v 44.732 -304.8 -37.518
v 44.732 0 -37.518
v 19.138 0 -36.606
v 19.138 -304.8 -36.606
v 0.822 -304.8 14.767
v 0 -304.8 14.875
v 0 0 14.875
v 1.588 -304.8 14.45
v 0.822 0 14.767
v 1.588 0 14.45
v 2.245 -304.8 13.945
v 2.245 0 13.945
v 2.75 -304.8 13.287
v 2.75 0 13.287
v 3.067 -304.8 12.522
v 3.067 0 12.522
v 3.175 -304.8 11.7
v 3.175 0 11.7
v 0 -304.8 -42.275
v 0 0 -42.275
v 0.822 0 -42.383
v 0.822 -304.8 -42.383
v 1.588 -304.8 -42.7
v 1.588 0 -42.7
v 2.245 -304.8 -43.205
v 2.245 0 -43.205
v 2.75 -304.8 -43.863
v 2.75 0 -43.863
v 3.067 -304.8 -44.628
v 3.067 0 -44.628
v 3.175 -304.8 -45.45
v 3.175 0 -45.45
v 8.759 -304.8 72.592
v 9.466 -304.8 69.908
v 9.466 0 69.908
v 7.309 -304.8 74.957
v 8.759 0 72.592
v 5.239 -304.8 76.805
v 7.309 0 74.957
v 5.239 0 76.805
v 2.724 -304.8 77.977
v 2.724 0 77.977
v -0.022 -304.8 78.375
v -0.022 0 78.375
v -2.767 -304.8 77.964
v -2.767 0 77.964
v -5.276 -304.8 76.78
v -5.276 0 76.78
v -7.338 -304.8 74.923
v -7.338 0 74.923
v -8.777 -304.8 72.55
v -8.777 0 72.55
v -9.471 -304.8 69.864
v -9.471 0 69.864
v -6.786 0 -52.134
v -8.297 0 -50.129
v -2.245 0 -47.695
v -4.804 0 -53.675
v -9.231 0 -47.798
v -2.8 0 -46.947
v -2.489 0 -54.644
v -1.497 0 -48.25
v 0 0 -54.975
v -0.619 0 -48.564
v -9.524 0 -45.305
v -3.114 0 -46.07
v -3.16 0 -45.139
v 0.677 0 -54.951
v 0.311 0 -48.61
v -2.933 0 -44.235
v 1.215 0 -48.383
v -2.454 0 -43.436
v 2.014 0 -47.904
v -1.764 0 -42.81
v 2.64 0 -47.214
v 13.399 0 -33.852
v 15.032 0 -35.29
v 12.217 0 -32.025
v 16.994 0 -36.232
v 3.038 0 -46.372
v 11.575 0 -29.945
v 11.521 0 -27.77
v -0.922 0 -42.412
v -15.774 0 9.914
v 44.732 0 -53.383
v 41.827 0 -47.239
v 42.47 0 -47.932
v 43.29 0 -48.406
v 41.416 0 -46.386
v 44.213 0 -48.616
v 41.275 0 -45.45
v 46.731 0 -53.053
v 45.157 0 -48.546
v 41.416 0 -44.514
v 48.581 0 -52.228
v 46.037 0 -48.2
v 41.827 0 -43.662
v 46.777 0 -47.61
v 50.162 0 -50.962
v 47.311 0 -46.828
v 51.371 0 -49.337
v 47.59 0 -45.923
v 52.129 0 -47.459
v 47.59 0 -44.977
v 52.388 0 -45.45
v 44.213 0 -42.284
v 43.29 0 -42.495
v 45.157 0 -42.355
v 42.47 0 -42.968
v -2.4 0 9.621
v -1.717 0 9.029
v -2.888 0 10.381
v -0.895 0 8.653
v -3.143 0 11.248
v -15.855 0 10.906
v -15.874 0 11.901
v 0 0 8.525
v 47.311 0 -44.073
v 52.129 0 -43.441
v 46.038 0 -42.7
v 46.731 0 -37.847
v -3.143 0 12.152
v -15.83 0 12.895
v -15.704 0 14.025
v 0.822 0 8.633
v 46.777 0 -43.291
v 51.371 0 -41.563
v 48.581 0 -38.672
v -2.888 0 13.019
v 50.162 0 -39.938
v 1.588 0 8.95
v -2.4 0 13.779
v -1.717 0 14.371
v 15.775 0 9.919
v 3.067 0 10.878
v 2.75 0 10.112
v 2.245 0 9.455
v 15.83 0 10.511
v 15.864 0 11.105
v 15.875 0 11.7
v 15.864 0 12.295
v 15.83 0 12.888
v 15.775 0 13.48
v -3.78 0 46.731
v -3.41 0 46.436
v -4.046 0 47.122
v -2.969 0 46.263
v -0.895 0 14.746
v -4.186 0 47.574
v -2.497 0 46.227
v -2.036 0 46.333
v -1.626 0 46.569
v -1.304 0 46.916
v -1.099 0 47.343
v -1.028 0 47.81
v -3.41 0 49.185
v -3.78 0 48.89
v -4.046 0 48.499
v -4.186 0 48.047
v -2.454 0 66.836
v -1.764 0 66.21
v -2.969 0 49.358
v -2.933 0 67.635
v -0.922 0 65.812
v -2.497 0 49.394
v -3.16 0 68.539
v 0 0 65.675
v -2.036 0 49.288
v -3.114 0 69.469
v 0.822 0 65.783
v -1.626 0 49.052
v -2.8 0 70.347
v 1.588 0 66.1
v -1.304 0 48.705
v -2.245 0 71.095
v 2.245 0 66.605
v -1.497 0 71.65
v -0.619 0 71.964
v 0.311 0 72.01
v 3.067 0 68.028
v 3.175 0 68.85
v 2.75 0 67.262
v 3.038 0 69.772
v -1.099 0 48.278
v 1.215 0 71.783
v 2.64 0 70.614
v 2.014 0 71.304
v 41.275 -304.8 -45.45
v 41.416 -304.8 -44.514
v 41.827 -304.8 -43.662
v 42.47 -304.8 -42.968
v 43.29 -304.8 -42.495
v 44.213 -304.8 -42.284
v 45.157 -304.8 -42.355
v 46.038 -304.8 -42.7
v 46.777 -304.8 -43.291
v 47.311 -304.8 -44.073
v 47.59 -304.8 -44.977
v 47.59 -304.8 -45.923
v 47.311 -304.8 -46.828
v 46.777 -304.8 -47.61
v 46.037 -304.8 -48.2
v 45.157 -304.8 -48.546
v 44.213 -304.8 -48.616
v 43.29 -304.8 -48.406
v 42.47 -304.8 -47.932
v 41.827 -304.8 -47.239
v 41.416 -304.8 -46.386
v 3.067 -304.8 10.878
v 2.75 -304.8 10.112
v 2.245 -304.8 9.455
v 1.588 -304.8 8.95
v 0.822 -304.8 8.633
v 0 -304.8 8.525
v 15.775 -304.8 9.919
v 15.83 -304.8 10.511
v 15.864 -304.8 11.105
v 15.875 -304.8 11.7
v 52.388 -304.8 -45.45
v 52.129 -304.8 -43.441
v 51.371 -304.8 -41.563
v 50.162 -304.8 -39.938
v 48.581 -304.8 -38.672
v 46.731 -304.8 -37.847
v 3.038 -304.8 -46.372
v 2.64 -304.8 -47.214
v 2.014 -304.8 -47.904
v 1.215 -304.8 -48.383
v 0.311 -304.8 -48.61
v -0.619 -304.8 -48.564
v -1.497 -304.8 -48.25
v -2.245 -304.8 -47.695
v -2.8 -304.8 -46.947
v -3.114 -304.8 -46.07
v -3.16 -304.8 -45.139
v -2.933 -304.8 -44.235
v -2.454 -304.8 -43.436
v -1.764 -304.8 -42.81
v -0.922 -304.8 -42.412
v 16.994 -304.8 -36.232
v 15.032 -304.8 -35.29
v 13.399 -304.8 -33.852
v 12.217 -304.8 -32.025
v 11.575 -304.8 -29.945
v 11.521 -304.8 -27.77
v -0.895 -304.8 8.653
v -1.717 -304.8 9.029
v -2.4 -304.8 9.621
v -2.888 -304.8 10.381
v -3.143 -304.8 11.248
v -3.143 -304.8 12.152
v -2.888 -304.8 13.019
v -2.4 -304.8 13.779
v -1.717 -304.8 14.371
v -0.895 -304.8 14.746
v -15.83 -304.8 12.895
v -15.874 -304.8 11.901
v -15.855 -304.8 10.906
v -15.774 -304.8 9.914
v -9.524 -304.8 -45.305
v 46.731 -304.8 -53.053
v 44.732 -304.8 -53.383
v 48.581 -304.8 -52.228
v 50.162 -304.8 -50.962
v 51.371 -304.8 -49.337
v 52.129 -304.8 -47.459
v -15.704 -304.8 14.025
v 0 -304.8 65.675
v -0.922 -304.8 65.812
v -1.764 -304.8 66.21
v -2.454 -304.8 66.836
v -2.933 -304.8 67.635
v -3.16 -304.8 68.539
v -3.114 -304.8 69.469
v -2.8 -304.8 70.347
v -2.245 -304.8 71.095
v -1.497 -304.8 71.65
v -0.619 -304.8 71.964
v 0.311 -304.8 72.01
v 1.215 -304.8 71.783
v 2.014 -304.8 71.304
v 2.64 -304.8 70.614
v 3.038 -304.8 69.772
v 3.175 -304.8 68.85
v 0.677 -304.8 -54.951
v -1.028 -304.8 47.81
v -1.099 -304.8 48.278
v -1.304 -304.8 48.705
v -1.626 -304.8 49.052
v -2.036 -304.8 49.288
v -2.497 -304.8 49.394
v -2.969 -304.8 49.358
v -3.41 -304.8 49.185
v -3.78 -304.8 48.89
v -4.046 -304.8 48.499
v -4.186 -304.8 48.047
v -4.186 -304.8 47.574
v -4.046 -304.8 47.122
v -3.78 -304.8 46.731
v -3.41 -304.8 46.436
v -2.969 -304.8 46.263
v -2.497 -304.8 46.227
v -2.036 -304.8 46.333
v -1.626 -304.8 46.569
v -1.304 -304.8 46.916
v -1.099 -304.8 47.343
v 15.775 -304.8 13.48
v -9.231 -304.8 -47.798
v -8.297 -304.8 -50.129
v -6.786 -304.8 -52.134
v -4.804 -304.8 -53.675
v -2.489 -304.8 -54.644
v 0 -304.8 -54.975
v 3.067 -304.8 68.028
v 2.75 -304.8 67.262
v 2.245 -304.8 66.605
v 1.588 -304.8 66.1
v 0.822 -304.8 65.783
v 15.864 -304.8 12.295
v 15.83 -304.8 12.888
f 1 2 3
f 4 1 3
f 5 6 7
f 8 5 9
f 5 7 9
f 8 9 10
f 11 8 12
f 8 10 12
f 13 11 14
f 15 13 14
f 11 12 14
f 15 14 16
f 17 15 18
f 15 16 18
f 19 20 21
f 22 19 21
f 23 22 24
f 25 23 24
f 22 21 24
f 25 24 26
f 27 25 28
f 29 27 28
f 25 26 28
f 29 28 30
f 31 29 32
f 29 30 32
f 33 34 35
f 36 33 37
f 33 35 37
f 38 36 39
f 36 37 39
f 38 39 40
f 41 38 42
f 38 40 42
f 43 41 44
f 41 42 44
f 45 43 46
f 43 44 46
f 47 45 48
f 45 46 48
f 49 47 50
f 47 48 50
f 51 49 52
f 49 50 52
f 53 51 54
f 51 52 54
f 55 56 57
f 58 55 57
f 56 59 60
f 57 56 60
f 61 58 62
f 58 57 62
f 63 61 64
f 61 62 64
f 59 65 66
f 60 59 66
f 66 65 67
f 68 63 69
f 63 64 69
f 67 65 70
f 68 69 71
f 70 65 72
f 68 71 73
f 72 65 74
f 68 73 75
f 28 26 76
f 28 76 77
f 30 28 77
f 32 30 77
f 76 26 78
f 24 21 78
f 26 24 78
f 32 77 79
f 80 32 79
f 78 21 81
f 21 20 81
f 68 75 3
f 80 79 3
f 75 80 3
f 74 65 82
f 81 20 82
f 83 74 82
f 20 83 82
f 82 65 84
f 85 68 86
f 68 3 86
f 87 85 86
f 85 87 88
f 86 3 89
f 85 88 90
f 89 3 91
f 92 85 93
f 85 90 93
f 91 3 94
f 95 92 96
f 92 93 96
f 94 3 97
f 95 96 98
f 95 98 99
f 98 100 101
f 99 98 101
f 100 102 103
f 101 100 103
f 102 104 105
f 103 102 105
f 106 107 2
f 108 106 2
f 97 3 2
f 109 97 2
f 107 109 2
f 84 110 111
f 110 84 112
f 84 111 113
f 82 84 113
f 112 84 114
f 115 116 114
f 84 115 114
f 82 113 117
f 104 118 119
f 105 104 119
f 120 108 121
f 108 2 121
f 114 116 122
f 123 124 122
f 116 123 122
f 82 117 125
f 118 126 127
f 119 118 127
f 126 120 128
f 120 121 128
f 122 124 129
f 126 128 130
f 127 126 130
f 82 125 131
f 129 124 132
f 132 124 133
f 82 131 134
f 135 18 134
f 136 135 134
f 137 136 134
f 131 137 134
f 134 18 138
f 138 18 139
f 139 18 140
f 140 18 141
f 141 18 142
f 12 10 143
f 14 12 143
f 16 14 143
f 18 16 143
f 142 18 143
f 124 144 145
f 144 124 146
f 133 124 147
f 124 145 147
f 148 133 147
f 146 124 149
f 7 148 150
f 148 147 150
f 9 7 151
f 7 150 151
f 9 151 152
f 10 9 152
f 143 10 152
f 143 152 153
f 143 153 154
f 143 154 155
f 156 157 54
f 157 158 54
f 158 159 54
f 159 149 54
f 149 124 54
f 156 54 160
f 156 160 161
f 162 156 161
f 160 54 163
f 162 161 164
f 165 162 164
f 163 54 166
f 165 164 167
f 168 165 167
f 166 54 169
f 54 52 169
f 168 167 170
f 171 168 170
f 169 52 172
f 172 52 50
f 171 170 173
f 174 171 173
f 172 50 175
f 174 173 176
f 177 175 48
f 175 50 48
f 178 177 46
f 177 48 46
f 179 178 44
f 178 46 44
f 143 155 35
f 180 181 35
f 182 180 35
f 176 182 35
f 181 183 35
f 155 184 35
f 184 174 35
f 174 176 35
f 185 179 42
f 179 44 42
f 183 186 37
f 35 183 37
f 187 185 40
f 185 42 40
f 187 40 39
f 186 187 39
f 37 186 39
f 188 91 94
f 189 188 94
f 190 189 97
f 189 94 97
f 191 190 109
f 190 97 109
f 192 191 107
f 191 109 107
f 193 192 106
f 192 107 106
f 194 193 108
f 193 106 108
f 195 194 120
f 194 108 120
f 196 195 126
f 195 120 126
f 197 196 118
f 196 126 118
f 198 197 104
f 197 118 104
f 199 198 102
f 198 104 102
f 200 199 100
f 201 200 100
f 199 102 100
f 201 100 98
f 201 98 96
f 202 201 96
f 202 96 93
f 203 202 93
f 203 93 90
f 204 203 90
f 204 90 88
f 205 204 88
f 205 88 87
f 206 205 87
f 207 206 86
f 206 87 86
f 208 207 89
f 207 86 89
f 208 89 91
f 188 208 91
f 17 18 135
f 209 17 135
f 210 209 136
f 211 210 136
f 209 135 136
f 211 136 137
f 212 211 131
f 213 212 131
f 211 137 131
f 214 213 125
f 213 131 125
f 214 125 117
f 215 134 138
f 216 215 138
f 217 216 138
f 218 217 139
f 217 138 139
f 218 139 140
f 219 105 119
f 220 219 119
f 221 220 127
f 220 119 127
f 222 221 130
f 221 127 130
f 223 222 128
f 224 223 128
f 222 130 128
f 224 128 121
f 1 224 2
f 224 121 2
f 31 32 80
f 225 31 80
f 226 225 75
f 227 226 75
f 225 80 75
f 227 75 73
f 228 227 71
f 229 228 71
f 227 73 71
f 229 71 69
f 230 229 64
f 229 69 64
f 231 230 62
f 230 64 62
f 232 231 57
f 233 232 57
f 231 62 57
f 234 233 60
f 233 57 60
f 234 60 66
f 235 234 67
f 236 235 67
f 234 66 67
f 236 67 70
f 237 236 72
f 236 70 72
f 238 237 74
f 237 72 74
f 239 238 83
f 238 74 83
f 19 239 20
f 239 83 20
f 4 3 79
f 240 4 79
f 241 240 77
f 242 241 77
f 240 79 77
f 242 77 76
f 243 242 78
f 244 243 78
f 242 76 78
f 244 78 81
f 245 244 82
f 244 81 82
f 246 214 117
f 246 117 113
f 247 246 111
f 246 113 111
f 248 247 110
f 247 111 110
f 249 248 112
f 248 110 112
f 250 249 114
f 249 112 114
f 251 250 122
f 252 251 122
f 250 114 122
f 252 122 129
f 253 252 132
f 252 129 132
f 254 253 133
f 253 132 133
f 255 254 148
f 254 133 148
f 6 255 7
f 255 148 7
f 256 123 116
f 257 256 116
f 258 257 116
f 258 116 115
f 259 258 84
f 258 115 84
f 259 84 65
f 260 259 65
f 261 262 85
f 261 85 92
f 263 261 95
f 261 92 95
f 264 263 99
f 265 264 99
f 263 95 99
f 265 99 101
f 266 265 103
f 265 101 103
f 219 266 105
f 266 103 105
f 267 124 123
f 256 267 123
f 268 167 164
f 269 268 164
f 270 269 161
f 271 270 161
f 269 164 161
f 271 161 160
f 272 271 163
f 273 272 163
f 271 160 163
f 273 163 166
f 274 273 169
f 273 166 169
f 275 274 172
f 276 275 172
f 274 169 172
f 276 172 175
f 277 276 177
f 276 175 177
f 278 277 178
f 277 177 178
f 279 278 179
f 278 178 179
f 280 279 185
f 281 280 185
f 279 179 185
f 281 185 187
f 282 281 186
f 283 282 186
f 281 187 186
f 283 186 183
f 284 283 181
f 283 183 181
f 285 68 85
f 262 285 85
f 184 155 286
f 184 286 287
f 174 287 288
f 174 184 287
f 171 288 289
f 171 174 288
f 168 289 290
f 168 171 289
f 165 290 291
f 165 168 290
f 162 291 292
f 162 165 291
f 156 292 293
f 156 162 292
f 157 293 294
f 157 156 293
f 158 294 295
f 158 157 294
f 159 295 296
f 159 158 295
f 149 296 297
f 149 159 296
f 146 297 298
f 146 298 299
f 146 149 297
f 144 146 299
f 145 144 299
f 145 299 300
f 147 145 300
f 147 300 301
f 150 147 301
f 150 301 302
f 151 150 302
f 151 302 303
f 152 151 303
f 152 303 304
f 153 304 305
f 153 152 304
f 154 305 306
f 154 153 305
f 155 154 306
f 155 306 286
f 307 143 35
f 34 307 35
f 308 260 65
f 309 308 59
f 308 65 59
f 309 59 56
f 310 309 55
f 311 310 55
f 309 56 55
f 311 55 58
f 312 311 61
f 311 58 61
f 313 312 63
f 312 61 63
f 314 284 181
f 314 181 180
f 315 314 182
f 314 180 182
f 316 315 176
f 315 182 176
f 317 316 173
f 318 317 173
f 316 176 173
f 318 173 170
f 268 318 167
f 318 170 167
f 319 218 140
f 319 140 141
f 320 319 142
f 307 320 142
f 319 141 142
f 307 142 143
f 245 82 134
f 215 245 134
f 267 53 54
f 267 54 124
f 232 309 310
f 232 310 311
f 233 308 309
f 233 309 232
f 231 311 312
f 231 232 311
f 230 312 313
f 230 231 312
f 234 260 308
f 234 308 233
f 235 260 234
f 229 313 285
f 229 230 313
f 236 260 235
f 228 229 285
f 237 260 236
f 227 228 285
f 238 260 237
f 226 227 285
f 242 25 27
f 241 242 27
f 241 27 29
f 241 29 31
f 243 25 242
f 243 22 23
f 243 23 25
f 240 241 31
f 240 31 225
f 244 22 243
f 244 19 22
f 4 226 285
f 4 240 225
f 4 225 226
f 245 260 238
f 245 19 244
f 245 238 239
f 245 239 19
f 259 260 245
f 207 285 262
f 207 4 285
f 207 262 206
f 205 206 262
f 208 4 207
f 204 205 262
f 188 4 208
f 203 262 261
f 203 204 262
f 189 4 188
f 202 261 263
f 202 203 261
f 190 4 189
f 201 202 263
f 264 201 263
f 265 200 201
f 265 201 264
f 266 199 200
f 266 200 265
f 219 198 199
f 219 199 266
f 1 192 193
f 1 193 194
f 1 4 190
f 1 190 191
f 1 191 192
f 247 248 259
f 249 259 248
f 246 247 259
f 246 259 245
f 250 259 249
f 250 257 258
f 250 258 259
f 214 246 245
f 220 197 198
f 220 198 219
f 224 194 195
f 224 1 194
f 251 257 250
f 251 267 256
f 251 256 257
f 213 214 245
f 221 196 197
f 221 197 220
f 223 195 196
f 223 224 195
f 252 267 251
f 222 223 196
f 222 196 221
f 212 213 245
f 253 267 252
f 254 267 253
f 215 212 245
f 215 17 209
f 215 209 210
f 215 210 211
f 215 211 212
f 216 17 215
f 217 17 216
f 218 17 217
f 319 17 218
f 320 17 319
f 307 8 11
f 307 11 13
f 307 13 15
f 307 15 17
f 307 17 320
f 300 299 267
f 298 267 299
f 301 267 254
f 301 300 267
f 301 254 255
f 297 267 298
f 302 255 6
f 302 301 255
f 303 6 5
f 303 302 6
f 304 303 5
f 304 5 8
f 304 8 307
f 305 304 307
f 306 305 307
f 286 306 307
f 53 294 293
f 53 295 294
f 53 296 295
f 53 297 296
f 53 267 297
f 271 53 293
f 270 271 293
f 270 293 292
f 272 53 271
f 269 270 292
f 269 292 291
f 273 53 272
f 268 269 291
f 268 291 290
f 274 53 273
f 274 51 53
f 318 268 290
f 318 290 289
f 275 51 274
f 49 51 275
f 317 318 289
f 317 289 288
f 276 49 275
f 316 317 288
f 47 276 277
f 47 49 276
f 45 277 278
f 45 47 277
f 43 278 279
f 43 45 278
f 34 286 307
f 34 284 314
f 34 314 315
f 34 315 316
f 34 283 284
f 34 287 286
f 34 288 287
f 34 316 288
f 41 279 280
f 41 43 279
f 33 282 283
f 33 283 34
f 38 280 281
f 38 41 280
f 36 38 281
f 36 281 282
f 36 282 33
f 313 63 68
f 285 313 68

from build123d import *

# Parameters (mm, degrees)
F0_R     = 1.5875
F1_DEPTH = 304.8


# Not quite as in the source:
# - ends of sketch curves that miss each other by under 0.0002 mm in the source are joined


with BuildPart() as f1:
    # F0 (on Front) → F1 (new body)
    with BuildSketch(Plane.XZ):
        with BuildLine():
            Line((0, -35.9251248209), (0, -42.2751248896))
            ThreePointArc((0, -42.2751248896), (2.2450640303, -43.2050608593), (3.175, -45.4501248896))
            Line((3.175, -45.4501248896), (9.5250000687, -45.4501248896))
            ThreePointArc((9.5250000687, -45.4501248896), (6.7351921394, -38.7149327502), (0, -35.9251248209))
        make_face()
        with BuildLine():
            ThreePointArc((3.175, -45.4501248896), (-2.2450640303, -47.6951889199), (0, -42.2751248896))
            Line((0, -42.2751248896), (0, -35.9251248209))
            ThreePointArc((0, -35.9251248209), (-6.6836697304, -38.6638014929), (-9.5238937406, -45.3049548981))
            ThreePointArc((-9.5238937406, -45.3049548981), (-6.7863233967, -52.13379462), (0, -54.9751249583))
            Line((0, -54.9751249583), (0.6773435819, -54.951010742))
            ThreePointArc((0.6773435819, -54.951010742), (6.9705567917, -51.941424014), (9.5250000687, -45.4501248896))
            Line((9.5250000687, -45.4501248896), (3.175, -45.4501248896))
        make_face()
        with BuildLine():
            Line((36.5125, -45.4501248896), (9.5250000687, -45.4501248896))
            ThreePointArc((9.5250000687, -45.4501248896), (6.9705567917, -51.941424014), (0.6773435819, -54.951010742))
            Line((0.6773435819, -54.951010742), (44.7324052867, -53.3825995038))
            ThreePointArc((44.7324052867, -53.3825995038), (38.9380895197, -51.1617576778), (36.5125, -45.4501248896))
        make_face()
        with BuildLine():
            Line((0, -4.1751248896), (0, -35.9251248209))
            ThreePointArc((0, -35.9251248209), (6.7351921394, -38.7149327502), (9.5250000687, -45.4501248896))
            Line((9.5250000687, -45.4501248896), (36.5125, -45.4501248896))
            ThreePointArc((36.5125, -45.4501248896), (38.9380895197, -39.7384921015), (44.7324052867, -37.5176502755))
            Line((44.7324052867, -37.5176502755), (19.1378694473, -36.6064551461))
            ThreePointArc((19.1378694473, -36.6064551461), (13.3988872221, -33.8519658653), (11.5206935861, -27.7695718592))
            Line((11.5206935861, -27.7695718592), (15.7748262706, 9.9192906189))
            ThreePointArc((15.7748262706, 9.9192906189), (10.5770706294, -0.1382498214), (0, -4.1751248896))
        make_face()
        with BuildLine():
            ThreePointArc((-9.5238937406, -45.3049548981), (-6.6836697304, -38.6638014929), (0, -35.9251248209))
            Line((0, -35.9251248209), (0, -4.1751248896))
            ThreePointArc((0, -4.1751248896), (-10.5752191937, -0.1399037729), (-15.7742685853, 9.9143568106))
            Line((-15.7742685853, 9.9143568106), (-9.5238937406, -45.3049548981))
        make_face()
        with BuildLine():
            ThreePointArc((-15.7038062969, 14.0249757078), (-10.370743778, 23.7191637121), (0, 27.5748751104))
            Line((0, 27.5748751104), (0, 47.8104427457))
            Line((0, 47.8104427457), (0, 59.3248751104))
            ThreePointArc((0, 59.3248751104), (-7.0846213328, 62.4832617586), (-9.4708755422, 69.8638482188))
            Line((-9.4708755422, 69.8638482188), (-15.7038062969, 14.0249757078))
        make_face()
        with Locations((-2.6159647387, 47.8104427457)):
            Circle(F0_R, mode=Mode.SUBTRACT)
        with BuildLine():
            Line((0, 47.8104427457), (0, 27.5748751104))
            ThreePointArc((0, 27.5748751104), (10.5770706294, 23.5380000422), (15.7748262706, 13.4804596019))
            Line((15.7748262706, 13.4804596019), (9.4660212705, 69.9082069616))
            ThreePointArc((9.4660212705, 69.9082069616), (9.5102438875, 69.3798620908), (9.525, 68.8498751104))
            ThreePointArc((9.525, 68.8498751104), (6.7351920908, 62.1146830196), (0, 59.3248751104))
            Line((0, 59.3248751104), (0, 47.8104427457))
        make_face()
        with BuildLine():
            ThreePointArc((9.4660212705, 69.9082069616), (-0.0223117795, 78.3748489783), (-9.4708755422, 69.8638482188))
            ThreePointArc((-9.4708755422, 69.8638482188), (-7.0846213328, 62.4832617586), (0, 59.3248751104))
            ThreePointArc((0, 59.3248751104), (6.7351920908, 62.1146830196), (9.525, 68.8498751104))
            ThreePointArc((9.525, 68.8498751104), (9.5102438875, 69.3798620908), (9.4660212705, 69.9082069616))
        make_face()
        with BuildLine():
            ThreePointArc((3.175, 68.8498751104), (2.2450640303, 66.6048110801), (0, 65.6748751104))
            ThreePointArc((0, 65.6748751104), (-2.2450640303, 71.0949391407), (3.175, 68.8498751104))
        make_face(mode=Mode.SUBTRACT)
        with BuildLine():
            ThreePointArc((44.7324052867, -37.5176502755), (38.9380895197, -39.7384921015), (36.5125, -45.4501248896))
            ThreePointArc((36.5125, -45.4501248896), (38.9380895197, -51.1617576778), (44.7324052867, -53.3825995038))
            ThreePointArc((44.7324052867, -53.3825995038), (50.1616327882, -50.96203537), (52.3875, -45.4501248896))
            ThreePointArc((52.3875, -45.4501248896), (50.1616327882, -39.9382144093), (44.7324052867, -37.5176502755))
        make_face()
        with BuildLine():
            ThreePointArc((47.625, -45.4501248896), (44.45, -48.6251248896), (41.275, -45.4501248896))
            ThreePointArc((41.275, -45.4501248896), (44.45, -42.2751248896), (47.625, -45.4501248896))
        make_face(mode=Mode.SUBTRACT)
        with BuildLine():
            Line((0, 8.5248751104), (0, -4.1751248896))
            ThreePointArc((0, -4.1751248896), (10.5770706294, -0.1382498214), (15.7748262706, 9.9192906189))
            ThreePointArc((15.7748262706, 9.9192906189), (15.8499367829, 10.8081750617), (15.875, 11.6998751104))
            ThreePointArc((15.875, 11.6998751104), (15.8499367829, 12.5915751591), (15.7748262706, 13.4804596019))
            ThreePointArc((15.7748262706, 13.4804596019), (10.5770706294, 23.5380000422), (0, 27.5748751104))
            Line((0, 27.5748751104), (0, 14.8748751104))
            ThreePointArc((0, 14.8748751104), (2.2450640303, 13.9449391407), (3.175, 11.6998751104))
            ThreePointArc((3.175, 11.6998751104), (2.2450640303, 9.4548110801), (0, 8.5248751104))
        make_face()
        with BuildLine():
            ThreePointArc((-15.7742685853, 9.9143568106), (-10.5752191937, -0.1399037729), (0, -4.1751248896))
            Line((0, -4.1751248896), (0, 8.5248751104))
            ThreePointArc((0, 8.5248751104), (-3.175, 11.6998751104), (0, 14.8748751104))
            Line((0, 14.8748751104), (0, 27.5748751104))
            ThreePointArc((0, 27.5748751104), (-10.370743778, 23.7191637121), (-15.7038062969, 14.0249757078))
            Line((-15.7038062969, 14.0249757078), (-15.8299773584, 12.8946310826))
            ThreePointArc((-15.8299773584, 12.8946310826), (-15.8722272886, 11.4031835217), (-15.7742685853, 9.9143568106))
        make_face()
    extrude(amount=F1_DEPTH)


solid = f1.part
